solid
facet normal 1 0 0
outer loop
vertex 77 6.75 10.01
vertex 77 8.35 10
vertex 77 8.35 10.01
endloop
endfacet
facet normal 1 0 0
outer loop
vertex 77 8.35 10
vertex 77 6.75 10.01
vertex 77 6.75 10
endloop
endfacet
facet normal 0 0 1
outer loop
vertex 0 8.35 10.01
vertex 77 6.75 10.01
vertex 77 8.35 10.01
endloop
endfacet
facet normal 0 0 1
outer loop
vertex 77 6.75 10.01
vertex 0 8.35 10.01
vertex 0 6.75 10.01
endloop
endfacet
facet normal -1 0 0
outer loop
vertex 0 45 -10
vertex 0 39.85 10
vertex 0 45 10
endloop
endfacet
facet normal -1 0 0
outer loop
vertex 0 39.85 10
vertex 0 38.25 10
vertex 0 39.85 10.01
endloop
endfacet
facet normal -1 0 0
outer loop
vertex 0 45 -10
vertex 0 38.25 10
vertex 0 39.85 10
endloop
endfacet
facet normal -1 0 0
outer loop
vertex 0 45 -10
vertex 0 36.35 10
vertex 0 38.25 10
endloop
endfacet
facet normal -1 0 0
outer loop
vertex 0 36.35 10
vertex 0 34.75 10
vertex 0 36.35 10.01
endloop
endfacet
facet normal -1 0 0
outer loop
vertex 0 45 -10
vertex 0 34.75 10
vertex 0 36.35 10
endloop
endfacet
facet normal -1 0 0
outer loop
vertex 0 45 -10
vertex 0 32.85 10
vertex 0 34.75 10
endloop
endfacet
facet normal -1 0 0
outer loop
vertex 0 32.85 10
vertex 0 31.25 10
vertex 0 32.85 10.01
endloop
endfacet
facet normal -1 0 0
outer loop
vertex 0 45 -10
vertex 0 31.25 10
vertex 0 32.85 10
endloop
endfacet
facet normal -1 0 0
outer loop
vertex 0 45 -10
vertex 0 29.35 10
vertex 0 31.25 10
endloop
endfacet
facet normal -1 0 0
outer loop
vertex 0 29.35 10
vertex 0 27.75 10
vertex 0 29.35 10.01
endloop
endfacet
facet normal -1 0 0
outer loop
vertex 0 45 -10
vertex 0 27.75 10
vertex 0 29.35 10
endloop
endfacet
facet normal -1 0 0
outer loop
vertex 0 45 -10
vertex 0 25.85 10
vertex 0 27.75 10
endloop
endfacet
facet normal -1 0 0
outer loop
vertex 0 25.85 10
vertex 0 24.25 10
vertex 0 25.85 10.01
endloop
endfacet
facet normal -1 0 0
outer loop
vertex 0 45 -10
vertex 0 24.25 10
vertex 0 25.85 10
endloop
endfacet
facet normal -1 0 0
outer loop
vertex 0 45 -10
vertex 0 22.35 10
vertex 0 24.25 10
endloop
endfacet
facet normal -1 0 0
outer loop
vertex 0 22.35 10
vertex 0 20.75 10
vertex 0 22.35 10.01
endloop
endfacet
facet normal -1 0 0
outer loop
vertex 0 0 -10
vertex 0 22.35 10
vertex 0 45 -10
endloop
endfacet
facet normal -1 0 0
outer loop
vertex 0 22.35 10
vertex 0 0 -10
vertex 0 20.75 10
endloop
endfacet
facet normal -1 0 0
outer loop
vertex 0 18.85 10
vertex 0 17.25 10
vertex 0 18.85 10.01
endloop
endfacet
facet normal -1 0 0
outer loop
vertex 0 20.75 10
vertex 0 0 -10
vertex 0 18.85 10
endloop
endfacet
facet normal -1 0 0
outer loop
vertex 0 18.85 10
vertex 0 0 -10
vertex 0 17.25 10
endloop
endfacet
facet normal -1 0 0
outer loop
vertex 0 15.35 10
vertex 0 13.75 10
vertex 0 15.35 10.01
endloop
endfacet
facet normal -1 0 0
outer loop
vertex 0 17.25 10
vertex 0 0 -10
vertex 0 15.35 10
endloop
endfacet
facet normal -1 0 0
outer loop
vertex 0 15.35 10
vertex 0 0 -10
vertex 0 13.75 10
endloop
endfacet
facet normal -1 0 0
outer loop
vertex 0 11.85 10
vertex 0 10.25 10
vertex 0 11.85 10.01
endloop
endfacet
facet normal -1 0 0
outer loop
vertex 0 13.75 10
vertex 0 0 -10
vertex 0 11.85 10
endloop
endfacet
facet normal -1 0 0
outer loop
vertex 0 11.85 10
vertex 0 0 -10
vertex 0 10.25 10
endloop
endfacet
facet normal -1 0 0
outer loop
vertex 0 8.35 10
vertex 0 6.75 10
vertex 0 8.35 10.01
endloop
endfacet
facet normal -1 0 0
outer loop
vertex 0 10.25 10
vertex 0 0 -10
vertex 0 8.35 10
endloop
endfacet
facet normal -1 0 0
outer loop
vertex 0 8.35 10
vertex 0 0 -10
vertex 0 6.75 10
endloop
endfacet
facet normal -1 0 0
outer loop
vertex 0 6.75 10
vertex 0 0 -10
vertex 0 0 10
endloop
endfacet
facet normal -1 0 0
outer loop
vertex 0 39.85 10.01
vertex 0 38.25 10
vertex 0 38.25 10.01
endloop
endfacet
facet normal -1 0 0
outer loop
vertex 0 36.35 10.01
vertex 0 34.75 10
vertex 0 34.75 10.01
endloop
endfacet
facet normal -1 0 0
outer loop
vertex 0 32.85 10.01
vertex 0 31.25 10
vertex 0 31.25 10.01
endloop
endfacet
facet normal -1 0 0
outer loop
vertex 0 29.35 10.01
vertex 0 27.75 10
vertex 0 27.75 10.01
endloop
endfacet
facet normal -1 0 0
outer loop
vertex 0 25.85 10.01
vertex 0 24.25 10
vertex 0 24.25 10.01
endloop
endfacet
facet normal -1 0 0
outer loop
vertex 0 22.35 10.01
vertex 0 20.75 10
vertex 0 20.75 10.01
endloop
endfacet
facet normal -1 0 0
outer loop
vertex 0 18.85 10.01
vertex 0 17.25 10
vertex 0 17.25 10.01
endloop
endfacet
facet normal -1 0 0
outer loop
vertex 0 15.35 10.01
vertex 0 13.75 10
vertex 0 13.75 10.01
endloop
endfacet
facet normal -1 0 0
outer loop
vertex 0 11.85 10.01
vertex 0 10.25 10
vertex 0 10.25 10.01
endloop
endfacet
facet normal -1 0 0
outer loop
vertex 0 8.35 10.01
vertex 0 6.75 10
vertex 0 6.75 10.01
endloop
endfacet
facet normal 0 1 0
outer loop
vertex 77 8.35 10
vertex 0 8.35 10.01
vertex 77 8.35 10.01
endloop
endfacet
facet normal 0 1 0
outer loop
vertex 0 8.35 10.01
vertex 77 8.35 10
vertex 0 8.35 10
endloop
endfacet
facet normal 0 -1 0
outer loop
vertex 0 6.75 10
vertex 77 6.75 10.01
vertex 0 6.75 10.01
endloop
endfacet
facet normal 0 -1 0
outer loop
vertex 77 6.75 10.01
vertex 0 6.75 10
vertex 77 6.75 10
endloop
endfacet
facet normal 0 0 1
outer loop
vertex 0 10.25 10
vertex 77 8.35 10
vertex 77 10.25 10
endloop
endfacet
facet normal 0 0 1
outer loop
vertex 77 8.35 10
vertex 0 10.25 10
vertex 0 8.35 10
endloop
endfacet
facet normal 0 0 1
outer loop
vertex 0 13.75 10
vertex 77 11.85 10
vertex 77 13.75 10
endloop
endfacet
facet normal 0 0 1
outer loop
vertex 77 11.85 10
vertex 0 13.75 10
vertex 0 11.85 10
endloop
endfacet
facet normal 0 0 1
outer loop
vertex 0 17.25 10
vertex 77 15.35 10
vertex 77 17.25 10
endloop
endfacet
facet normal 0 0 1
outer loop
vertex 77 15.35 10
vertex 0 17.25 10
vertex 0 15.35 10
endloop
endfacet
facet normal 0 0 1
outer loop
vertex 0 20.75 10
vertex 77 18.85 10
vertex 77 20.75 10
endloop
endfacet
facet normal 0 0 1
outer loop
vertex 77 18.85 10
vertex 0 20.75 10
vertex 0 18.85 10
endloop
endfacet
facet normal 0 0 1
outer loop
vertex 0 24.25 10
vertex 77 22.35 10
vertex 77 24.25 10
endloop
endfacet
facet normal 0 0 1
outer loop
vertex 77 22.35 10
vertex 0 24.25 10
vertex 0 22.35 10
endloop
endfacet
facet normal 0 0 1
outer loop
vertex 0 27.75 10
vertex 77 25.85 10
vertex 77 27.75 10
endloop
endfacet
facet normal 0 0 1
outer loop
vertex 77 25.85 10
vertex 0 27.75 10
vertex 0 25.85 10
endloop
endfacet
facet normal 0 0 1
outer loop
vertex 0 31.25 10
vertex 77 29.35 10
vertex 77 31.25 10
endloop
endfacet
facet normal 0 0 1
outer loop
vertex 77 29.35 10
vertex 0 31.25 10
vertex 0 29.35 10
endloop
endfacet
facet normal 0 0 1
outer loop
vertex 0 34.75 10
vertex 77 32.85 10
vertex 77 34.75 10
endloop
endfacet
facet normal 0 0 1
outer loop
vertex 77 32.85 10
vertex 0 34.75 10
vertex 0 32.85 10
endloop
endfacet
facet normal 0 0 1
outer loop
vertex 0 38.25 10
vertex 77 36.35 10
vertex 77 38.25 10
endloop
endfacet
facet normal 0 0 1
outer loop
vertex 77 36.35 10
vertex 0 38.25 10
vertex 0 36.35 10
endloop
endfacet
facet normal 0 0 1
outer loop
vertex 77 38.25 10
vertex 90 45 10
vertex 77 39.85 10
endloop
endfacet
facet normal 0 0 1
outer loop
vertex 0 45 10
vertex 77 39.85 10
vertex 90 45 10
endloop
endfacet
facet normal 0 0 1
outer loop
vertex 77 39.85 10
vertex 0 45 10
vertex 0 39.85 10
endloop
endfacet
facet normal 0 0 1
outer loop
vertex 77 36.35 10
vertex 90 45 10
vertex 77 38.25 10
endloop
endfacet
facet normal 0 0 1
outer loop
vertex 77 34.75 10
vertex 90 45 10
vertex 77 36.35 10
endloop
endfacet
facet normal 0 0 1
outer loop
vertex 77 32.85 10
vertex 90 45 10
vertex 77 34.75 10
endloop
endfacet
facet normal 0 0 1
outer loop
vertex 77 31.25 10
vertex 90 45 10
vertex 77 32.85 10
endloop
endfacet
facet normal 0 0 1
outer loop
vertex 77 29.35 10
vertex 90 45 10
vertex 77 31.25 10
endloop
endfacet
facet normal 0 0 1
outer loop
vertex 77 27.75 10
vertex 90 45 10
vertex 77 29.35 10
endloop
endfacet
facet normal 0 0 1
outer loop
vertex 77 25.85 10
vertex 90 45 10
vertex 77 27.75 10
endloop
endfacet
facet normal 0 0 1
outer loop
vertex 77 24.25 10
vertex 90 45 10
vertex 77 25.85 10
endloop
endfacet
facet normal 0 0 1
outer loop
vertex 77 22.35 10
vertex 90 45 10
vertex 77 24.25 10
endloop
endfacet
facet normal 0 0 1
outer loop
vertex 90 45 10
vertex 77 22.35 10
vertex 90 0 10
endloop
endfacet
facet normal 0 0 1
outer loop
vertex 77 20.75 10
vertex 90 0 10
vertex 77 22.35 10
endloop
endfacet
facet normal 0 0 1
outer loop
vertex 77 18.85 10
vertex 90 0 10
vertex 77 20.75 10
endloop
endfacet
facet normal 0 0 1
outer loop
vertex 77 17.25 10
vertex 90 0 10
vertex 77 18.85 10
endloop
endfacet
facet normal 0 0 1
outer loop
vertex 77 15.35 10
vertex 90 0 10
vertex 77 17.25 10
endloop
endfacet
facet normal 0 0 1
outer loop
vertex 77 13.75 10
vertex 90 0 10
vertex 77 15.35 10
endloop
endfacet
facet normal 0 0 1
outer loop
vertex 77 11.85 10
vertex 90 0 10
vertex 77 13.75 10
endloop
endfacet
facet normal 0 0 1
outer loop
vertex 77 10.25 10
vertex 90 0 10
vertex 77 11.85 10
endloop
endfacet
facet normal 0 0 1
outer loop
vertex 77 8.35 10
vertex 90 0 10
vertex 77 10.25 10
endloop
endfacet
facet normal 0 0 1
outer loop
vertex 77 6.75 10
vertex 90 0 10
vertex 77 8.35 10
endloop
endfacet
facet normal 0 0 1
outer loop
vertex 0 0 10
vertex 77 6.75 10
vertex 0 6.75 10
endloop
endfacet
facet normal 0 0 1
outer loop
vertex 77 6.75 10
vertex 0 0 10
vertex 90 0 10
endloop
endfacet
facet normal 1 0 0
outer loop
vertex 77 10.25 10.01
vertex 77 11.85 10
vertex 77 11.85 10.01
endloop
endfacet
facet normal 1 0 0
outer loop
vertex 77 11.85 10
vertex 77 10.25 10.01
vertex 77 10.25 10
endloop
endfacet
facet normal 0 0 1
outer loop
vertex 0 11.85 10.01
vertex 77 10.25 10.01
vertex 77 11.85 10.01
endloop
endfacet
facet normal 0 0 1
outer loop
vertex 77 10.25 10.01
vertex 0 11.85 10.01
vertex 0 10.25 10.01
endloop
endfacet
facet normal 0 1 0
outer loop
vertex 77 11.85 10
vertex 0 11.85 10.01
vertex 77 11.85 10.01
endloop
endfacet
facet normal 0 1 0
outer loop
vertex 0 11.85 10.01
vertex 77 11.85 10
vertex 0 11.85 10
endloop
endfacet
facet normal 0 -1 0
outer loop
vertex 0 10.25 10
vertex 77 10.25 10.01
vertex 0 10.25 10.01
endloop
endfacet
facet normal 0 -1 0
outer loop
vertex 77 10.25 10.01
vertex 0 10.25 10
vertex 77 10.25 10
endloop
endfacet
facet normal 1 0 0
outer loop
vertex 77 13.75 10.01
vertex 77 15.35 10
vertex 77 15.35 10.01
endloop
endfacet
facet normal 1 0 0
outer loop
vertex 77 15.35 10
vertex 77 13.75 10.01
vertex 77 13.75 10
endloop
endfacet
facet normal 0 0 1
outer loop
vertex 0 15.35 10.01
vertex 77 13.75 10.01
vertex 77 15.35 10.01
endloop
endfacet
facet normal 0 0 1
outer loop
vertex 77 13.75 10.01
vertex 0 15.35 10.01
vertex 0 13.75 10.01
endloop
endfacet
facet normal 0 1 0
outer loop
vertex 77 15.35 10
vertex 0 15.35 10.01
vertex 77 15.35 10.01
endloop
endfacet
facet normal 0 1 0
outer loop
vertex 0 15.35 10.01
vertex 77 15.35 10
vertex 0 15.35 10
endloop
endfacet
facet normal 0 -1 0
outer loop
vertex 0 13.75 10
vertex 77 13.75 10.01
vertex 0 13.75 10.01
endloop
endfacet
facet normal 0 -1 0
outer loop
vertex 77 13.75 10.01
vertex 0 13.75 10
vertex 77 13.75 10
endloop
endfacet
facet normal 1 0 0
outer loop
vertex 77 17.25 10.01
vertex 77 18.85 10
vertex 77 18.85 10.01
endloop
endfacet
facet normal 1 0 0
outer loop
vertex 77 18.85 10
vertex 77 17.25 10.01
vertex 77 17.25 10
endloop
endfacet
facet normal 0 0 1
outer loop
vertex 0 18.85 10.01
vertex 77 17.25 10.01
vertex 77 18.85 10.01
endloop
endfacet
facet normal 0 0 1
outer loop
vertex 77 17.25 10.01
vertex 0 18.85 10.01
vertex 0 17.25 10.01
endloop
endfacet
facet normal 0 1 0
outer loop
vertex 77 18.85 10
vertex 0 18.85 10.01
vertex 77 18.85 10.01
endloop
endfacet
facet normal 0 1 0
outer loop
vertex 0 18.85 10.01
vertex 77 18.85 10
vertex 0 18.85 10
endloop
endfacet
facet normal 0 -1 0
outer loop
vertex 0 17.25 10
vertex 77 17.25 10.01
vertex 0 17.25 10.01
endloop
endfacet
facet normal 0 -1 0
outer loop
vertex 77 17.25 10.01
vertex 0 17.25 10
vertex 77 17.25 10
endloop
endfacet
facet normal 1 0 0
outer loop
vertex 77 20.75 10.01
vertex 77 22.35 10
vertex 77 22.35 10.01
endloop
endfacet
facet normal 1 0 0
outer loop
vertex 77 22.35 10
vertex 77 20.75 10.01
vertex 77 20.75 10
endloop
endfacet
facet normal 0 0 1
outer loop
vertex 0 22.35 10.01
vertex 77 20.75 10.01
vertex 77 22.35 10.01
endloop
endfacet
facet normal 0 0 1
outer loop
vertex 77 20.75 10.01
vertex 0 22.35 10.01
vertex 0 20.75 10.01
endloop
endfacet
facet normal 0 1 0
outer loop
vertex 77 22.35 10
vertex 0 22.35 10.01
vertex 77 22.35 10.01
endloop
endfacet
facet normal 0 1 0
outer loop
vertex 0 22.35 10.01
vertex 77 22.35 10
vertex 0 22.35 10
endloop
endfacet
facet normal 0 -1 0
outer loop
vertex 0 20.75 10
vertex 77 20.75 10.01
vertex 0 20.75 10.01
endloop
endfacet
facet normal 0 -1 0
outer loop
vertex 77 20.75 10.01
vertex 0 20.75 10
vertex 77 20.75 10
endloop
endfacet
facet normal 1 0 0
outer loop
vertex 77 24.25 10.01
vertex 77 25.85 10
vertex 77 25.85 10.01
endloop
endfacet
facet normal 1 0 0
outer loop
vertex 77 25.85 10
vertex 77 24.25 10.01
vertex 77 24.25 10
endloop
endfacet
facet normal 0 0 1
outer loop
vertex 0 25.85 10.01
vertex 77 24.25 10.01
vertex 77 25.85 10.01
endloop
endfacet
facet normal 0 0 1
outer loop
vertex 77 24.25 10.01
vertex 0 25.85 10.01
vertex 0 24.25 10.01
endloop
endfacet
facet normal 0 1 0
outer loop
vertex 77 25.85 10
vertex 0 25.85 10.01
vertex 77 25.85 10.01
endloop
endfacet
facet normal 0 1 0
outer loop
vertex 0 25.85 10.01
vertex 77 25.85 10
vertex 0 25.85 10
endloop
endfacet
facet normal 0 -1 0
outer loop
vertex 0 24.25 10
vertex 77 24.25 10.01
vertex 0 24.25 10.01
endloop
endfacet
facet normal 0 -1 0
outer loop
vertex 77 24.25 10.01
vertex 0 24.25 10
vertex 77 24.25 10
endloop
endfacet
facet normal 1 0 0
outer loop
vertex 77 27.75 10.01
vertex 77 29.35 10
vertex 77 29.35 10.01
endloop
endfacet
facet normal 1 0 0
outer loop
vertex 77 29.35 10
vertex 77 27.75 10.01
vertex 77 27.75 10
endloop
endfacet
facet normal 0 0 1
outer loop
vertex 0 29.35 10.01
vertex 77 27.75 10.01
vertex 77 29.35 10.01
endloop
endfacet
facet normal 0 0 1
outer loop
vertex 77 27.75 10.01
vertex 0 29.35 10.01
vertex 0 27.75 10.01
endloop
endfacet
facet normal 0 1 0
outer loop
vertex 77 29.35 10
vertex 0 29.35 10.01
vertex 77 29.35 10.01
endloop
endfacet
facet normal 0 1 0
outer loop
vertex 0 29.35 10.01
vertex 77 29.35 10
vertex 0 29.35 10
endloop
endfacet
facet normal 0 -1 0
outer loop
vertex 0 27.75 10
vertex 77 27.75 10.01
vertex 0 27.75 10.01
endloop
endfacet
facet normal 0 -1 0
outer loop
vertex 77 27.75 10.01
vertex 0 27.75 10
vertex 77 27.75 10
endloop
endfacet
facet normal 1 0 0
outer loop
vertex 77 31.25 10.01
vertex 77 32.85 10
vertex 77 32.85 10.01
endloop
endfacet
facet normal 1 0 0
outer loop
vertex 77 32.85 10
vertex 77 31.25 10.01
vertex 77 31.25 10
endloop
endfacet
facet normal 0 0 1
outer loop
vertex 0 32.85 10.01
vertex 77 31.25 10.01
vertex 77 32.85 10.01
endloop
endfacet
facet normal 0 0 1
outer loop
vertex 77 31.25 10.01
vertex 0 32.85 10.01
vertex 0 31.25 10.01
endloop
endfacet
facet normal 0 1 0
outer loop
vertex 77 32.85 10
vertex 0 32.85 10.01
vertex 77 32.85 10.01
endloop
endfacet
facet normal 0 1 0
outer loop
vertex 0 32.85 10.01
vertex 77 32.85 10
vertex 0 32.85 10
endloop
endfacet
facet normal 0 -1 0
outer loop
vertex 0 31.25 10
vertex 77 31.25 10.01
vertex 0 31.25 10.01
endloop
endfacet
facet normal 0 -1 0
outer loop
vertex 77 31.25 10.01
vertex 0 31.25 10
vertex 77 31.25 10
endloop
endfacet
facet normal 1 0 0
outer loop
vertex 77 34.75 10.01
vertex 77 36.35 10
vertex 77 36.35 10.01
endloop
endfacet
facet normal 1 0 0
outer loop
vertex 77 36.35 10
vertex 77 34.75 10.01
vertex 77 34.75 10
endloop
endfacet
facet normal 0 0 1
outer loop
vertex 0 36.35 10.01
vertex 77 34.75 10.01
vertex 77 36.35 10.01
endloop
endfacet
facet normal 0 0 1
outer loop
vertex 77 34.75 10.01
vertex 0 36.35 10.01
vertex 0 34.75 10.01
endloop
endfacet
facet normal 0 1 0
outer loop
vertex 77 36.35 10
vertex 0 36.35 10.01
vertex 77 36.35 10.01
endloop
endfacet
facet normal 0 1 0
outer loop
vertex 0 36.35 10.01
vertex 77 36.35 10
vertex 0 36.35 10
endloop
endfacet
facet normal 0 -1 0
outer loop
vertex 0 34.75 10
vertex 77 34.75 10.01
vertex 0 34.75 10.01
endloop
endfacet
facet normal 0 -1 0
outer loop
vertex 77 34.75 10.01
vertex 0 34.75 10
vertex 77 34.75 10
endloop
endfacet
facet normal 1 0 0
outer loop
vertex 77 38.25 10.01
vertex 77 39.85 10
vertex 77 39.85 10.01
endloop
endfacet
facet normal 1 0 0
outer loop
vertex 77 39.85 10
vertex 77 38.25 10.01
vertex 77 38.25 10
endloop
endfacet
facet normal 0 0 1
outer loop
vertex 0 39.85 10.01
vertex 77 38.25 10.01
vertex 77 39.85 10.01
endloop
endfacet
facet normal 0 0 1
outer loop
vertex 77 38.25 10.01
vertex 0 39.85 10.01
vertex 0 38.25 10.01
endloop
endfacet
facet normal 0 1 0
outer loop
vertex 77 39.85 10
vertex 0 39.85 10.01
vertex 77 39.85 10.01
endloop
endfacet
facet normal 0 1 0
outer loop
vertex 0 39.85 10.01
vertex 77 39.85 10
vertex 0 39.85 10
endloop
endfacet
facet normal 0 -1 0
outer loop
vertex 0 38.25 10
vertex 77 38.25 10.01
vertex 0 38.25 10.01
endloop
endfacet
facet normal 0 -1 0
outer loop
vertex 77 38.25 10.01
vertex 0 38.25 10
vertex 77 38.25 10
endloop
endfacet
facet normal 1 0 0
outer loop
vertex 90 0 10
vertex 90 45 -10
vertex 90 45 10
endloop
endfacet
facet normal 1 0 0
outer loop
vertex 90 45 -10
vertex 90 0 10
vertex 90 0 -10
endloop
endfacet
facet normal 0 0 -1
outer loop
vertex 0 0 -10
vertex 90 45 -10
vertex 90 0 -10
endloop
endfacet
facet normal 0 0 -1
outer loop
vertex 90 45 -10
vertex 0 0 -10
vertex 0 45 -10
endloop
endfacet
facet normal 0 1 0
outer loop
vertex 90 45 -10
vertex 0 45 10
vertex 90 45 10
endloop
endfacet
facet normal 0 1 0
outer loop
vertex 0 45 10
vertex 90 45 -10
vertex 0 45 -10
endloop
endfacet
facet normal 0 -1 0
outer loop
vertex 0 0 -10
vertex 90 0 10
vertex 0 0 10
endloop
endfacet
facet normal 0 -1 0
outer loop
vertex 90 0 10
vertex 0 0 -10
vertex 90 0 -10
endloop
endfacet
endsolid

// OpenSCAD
$fn = 64;

// Dimensions
slide_length = 75;     // mm
slide_width = 25;      // mm
slide_thickness = 1;    // mm

base_length = 90;      // mm (X)
base_width = 45;       // mm (Y)
base_height = 20;        // mm (Z)

slot_length = 77;       // mm (along X)
slot_width = 1.6;      // mm (Y direction)
slot_depth = 10;        // mm (into Z)

num_slots = 10;
center_to_center_spacing = 3.5; // mm (Y direction)

// Adjust for correct print orientation: part must rest on XY plane at z = 0
// The current model is centered at z = 0, but we want the base to sit flat on the bed at z = 0
// So we shift the entire model down by base_height / 2 = 10 mm

// Recalculate slot positions: centre the array in X and Y
total_y_span = (num_slots - 1) * center_to_center_spacing;
y_offset = (base_width - total_y_span) / 2; // offset to centre

// X is centred: slot_length is 77mm, base is 90mm, so 13mm overhang on each side
x_offset = (base_length - slot_length) / 2;

// Create base block, now shifted so that its bottom is at z = 0
translate([0, 0, -base_height / 2]) {
    cube([base_length, base_width, base_height], center = false);
}

// Create and position slots using difference
// Each slot is a rectangular prism cut into the top face, from z = 0 to z = slot_depth
// The slot must be fully within the base and open at the top (z = 0)
// We use a negative offset to ensure the slot is cut properly without coplanar faces

for (i = [0 : num_slots - 1]) {
    y_pos = y_offset + i * center_to_center_spacing;
    translate([0, y_pos, -base_height / 2]) {
        difference() {
            // Full rectangular prism to remove from base: from z = -base_height/2 to z = -base_height/2 + base_height
            // But we only want to cut from z = 0 (top) down to z = -10 (slot_depth)
            // So we define a cutter that extends 0.01 mm below the base to ensure clean cut
            cube([slot_length, slot_width, base_height + 0.01], center = false);
            // Subtract a slightly larger box to ensure no coplanar faces
            translate([0, 0, -0.01]) cube([slot_length, slot_width, base_height + 0.01], center = false);
        }
    }
}
